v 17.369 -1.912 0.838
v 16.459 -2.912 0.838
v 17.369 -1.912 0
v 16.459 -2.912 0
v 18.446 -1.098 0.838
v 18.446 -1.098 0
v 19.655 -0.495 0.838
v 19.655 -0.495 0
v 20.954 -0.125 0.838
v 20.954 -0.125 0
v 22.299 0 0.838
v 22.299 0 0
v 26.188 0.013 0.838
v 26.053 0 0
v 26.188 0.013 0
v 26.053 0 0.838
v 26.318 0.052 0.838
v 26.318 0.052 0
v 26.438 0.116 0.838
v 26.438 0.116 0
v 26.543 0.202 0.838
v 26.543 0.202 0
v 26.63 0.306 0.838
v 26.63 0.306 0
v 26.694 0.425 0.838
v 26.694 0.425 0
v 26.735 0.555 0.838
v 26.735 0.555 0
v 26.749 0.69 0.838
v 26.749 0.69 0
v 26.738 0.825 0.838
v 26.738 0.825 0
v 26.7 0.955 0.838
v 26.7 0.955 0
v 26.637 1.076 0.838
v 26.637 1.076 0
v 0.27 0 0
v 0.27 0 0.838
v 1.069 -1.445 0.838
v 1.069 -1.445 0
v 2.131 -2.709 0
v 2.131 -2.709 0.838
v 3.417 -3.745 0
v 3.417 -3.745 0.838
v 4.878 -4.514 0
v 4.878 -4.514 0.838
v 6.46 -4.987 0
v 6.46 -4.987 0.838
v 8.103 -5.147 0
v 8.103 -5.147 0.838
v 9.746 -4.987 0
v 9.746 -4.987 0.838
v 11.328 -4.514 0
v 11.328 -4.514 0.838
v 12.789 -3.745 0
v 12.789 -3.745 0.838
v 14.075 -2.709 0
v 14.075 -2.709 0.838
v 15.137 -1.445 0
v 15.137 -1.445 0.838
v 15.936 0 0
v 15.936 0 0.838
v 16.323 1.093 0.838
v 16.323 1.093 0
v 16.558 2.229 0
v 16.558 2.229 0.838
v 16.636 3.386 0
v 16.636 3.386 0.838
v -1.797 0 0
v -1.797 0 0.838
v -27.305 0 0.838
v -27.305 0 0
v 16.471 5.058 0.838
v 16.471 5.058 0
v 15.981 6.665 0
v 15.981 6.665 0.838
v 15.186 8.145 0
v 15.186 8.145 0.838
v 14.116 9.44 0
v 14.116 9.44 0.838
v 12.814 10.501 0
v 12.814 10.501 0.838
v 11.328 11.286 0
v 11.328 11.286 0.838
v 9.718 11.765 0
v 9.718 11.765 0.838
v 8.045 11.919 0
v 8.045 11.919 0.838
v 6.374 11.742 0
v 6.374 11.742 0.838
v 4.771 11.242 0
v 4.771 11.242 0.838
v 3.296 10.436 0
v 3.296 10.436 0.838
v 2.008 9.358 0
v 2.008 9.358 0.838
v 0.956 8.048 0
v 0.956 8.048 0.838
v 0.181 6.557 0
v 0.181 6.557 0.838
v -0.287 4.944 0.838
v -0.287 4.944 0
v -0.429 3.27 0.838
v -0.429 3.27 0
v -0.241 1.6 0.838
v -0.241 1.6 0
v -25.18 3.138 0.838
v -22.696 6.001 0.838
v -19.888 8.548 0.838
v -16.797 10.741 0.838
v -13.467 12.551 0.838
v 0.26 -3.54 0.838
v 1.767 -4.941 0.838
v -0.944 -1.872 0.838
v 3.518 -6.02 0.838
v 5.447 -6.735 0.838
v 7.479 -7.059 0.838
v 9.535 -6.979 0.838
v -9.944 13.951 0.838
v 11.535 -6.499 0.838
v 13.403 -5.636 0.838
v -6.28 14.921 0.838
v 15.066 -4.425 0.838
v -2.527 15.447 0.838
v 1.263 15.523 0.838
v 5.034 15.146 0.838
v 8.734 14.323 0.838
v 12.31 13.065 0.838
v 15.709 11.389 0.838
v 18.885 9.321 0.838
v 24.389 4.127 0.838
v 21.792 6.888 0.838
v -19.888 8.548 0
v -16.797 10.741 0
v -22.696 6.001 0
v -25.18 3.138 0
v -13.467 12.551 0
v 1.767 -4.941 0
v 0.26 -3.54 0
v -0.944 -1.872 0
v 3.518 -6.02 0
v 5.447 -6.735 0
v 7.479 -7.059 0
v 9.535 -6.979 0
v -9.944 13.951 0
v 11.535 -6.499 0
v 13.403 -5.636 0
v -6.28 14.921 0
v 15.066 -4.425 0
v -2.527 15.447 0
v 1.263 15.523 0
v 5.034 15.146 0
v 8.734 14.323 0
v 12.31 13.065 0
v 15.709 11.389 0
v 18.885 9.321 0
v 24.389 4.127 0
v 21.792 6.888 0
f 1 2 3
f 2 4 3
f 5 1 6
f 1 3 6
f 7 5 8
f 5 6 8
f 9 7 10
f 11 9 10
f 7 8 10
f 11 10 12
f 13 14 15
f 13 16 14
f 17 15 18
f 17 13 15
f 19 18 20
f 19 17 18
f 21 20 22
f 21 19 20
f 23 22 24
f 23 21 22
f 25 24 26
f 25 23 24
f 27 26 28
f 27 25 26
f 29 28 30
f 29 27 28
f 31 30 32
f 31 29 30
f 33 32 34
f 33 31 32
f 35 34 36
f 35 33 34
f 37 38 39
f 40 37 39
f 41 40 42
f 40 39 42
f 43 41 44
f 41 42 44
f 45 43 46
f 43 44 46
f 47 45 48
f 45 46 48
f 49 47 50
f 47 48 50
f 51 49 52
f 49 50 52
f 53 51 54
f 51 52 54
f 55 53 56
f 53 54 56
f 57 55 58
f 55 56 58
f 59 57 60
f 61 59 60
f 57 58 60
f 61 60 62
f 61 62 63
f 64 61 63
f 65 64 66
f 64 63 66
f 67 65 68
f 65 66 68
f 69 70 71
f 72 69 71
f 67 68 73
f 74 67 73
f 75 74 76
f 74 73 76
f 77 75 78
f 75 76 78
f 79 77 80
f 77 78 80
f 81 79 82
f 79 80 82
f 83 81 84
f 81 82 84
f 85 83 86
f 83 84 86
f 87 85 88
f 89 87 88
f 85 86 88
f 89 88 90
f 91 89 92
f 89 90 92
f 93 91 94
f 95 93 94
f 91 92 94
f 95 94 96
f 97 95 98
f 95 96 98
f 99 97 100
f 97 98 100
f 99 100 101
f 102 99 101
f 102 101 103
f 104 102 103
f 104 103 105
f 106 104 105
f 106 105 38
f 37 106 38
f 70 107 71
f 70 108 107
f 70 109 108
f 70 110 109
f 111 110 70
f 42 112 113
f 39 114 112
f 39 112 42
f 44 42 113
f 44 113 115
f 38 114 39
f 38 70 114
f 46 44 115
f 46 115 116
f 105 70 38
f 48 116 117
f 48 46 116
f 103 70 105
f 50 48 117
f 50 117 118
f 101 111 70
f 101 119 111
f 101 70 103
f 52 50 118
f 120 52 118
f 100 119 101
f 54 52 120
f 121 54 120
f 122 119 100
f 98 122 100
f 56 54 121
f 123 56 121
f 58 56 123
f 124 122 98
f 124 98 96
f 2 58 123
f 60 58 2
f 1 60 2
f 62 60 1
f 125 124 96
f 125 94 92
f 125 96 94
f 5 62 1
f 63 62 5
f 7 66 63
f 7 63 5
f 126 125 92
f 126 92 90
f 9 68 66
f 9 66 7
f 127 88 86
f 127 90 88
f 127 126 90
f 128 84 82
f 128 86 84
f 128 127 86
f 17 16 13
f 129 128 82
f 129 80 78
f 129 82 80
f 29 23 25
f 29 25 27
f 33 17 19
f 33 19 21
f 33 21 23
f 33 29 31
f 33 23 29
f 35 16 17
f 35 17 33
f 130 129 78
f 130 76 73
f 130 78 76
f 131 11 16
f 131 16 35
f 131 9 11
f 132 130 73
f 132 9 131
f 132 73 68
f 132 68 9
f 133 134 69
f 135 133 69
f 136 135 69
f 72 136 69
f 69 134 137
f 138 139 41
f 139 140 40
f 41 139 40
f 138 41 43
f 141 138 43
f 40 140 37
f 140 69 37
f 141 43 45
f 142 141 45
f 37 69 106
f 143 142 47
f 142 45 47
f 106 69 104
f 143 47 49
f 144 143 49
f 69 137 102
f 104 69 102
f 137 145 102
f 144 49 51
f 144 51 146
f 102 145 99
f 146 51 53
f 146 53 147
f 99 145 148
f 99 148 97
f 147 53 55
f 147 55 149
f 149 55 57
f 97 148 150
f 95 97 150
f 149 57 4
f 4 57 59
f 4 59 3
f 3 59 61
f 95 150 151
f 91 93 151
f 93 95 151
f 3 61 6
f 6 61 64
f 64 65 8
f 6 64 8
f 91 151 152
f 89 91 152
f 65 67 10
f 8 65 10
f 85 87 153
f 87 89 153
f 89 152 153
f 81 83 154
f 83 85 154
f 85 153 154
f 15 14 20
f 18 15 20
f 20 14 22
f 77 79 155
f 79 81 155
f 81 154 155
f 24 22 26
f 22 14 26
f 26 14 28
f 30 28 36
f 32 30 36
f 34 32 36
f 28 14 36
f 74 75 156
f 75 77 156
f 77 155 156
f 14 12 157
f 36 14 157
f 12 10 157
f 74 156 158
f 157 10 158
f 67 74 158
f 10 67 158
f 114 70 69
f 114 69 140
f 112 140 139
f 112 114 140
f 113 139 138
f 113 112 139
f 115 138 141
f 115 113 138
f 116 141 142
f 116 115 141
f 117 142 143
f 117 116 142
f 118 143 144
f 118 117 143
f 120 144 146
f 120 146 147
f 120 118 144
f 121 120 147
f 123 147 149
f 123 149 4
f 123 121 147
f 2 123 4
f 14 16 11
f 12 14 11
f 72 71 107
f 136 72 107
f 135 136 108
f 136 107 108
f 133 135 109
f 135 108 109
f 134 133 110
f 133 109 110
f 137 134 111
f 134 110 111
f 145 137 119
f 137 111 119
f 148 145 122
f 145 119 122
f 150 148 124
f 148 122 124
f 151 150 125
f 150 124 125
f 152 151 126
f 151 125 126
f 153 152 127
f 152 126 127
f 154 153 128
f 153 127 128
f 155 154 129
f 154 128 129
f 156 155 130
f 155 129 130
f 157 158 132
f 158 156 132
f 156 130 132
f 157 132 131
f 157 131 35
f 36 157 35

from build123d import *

# Parameters (mm, degrees)
F0_R      = 27.305
F1_DEPTH  = 0.8382
F3_DEPTH  = 25.4
F5_DEPTH  = 25.4
F9_DEPTH  = 0.8382
F10_DEPTH = 17.5768
F11_R     = 7.312924092
F12_R     = 0.6966323576


with BuildPart() as f1:
    # F0 (on Top) → F1 (new body)
    with BuildSketch(Plane.XY):
        Circle(F0_R)
    extrude(amount=F1_DEPTH)

    # F2 (on face) → F3 (cut)
    with BuildSketch(Plane.XY.offset(0.8382)):
        with BuildLine():
            Line((27.305, 0), (-27.305, 0))
            ThreePointArc((-27.305, 0), (0, -27.305), (27.305, 0))
        make_face()
    extrude(amount=-F3_DEPTH, mode=Mode.SUBTRACT)

    # F4 (on face) → F5 (cut)
    with BuildSketch(Plane.XY.offset(0.8382)):
        with BuildLine():
            ThreePointArc((-27.305, 0), (0, 15.5481644558), (27.305, 0))
            ThreePointArc((27.305, 0), (0, 27.305), (-27.305, 0))
        make_face()
    extrude(amount=-F5_DEPTH, mode=Mode.SUBTRACT)

    # F7 (on face) + F6 (on face) → F9 (join)
    with BuildSketch(Plane.XY.offset(0.8382)):
        with BuildLine():
            Line((-1.7974979465, 0), (18.003700975, 0))
            ThreePointArc((18.003700975, 0), (18.4250061935, 1.6697896776), (18.566720813, 3.3860683907))
            ThreePointArc((18.566720813, 3.3860683907), (6.3868228012, 13.7079730699), (-1.7974979465, 0))
        make_face()
    with BuildSketch(Plane.XY.offset(0.8382)):
        with BuildLine():
            Line((18.003700975, 0), (-1.7974979465, 0))
            ThreePointArc((-1.7974979465, 0), (8.1031015143, -7.077550908), (18.003700975, 0))
        make_face()
    extrude(amount=-F9_DEPTH)

    # F8 (on face) → F10 (cut)
    with BuildSketch(Plane.XY.offset(0.8382)):
        with BuildLine():
            ThreePointArc((15.935749386, 0), (16.4593427121, 1.6571771644), (16.6363208264, 3.3860683907))
            ThreePointArc((16.6363208264, 3.3860683907), (6.374210288, 11.7423095885), (0.2704536426, 0))
            Line((0.2704536426, 0), (15.935749386, 0))
        make_face()
        with BuildLine():
            Line((15.935749386, 0), (0.2704536426, 0))
            ThreePointArc((0.2704536426, 0), (8.1031015143, -5.1471509214), (15.935749386, 0))
        make_face()
    extrude(amount=-F10_DEPTH, mode=Mode.SUBTRACT)

    # F11
    f11_edges = [f1.edges().sort_by_distance(p)[0] for p in [
        (18.003701, 0, 0.4191),
    ]]
    fillet(f11_edges, radius=F11_R)

    # F12
    f12_edges = [f1.edges().sort_by_distance(p)[0] for p in [
        (27.305, 0, 0.4191),
    ]]
    fillet(f12_edges, radius=F12_R)


solid = f1.part
